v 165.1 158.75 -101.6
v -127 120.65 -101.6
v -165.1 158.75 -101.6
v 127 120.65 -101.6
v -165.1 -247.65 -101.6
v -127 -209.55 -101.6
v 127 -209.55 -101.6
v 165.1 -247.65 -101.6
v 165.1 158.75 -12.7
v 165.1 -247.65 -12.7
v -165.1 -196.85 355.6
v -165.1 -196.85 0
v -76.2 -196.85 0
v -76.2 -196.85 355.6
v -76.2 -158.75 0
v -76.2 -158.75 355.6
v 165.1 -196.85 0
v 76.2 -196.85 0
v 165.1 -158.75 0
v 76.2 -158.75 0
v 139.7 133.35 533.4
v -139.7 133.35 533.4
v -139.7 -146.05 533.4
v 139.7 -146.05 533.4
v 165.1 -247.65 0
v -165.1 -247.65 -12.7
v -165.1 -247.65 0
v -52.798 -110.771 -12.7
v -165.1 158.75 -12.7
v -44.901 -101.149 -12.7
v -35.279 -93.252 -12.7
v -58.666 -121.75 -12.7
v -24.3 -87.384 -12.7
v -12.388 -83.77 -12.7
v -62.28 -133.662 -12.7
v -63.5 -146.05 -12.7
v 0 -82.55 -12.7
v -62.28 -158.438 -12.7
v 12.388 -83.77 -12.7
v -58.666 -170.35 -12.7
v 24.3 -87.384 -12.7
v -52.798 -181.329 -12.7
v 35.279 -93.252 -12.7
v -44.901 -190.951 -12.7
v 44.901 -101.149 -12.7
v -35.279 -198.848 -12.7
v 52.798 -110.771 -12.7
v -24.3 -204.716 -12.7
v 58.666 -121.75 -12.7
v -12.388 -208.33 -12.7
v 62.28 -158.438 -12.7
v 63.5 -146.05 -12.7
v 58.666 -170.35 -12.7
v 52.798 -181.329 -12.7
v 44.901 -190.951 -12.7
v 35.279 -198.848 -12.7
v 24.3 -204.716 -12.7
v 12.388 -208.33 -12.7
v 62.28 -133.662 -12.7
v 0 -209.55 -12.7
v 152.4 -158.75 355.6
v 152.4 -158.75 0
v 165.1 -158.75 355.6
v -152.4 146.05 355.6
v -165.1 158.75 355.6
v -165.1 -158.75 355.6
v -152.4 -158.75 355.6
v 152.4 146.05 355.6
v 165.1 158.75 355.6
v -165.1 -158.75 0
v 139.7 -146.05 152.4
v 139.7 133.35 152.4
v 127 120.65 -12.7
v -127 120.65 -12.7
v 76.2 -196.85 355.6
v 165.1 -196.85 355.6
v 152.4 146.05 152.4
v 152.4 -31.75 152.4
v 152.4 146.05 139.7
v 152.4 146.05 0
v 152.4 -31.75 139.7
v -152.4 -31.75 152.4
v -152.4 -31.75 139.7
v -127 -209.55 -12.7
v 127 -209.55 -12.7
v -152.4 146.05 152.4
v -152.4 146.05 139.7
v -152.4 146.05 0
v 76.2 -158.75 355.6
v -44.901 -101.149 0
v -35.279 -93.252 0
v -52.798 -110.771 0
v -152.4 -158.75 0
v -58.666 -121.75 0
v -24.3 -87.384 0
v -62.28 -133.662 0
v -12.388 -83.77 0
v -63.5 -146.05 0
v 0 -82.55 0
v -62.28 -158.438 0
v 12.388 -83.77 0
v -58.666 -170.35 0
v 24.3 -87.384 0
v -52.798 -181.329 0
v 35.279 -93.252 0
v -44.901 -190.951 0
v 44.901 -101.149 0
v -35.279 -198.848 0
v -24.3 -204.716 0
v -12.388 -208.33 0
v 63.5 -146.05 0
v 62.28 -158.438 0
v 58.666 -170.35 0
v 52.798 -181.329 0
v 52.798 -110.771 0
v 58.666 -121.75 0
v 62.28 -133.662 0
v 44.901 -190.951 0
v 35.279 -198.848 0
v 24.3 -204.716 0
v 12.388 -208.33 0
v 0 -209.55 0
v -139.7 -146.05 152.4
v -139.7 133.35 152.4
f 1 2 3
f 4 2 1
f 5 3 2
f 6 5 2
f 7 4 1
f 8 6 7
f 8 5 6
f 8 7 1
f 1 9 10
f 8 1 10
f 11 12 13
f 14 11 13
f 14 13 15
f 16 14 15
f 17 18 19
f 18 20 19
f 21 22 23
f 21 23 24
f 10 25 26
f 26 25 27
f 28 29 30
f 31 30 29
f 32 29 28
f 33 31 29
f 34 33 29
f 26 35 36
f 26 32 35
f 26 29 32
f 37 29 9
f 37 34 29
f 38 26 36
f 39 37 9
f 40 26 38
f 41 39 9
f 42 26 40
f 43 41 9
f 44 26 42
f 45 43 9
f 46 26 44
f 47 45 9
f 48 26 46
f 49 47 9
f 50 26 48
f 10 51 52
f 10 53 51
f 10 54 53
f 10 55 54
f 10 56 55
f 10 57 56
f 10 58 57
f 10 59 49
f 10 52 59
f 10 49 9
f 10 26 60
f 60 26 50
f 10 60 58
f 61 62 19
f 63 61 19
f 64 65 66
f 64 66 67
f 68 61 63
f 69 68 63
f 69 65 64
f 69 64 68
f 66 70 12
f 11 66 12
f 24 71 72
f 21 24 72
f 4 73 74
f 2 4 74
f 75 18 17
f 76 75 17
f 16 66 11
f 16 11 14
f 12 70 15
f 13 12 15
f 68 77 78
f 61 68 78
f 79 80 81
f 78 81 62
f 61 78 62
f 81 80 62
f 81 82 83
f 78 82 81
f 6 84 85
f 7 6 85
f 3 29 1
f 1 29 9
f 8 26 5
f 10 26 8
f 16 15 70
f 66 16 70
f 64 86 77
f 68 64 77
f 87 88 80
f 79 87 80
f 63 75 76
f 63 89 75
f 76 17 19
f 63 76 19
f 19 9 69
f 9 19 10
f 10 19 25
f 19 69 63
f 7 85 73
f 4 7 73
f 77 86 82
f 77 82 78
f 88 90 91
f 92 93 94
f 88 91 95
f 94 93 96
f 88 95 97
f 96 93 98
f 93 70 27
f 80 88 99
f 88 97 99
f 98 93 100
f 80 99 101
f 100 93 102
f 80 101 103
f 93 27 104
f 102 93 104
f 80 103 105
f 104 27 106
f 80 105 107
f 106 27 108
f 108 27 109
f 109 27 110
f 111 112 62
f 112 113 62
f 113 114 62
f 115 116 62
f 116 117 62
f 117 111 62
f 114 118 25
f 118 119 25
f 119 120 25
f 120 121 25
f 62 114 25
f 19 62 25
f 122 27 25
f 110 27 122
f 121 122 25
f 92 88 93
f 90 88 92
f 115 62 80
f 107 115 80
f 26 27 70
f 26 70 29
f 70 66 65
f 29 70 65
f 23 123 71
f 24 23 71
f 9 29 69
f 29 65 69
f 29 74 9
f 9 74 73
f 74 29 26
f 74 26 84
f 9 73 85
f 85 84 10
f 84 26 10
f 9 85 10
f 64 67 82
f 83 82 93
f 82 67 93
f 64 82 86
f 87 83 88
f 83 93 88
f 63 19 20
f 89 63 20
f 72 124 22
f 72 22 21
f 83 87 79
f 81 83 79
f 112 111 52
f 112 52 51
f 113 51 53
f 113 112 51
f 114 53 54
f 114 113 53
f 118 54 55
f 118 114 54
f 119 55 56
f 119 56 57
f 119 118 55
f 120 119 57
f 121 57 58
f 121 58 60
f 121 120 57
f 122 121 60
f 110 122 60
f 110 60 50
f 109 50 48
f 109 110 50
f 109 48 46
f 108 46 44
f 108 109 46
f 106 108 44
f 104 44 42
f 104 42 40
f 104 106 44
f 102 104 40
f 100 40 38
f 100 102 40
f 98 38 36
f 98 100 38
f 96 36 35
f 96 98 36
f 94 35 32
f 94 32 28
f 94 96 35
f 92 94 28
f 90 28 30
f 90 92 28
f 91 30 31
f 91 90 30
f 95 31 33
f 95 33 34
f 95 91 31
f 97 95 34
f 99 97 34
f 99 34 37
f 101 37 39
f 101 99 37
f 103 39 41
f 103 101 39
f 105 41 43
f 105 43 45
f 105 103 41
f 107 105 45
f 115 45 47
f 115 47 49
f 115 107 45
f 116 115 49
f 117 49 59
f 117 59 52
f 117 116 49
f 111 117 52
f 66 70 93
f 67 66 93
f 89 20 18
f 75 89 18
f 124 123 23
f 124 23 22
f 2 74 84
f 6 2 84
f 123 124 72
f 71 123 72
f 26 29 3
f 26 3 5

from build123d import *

# Parameters (mm, degrees)
F1_DEPTH  = 355.6
F2_R      = 63.5
F3_DEPTH  = 12.7
F4_W      = 330.2
F4_H      = 406.4
F5_DEPTH  = 88.9
F7_W      = 279.4
F7_H      = 279.4
F8_DEPTH  = 381
F10_DEPTH = 355.6
F11_W     = 304.8
F11_H     = 177.8
F12_DEPTH = 12.7


with BuildPart() as f1:
    # F0 (on Top) → F1 (new body)
    with BuildSketch(Plane.XY):
        Polygon((165.1, 158.75), (-165.1, 158.75), (-165.1, -158.75), (-152.4, -158.75), (-152.4, 146.05), (152.4, 146.05), (152.4, -158.75), (165.1, -158.75), align=None)
    extrude(amount=F1_DEPTH)

    # F2 (on face) → F3 (join)
    with BuildSketch(Plane(origin=(0, 0, 0), x_dir=(1, 0, 0), z_dir=(0, 0, -1))):
        Polygon((152.4, 158.75), (165.1, 158.75), (165.1, 247.65), (-165.1, 247.65), (-165.1, 158.75), (-152.4, 158.75), (-152.4, -146.05), (152.4, -146.05), align=None)
        with Locations((0, 146.05)):
            Circle(F2_R, mode=Mode.SUBTRACT)
        Polygon((-165.1, -158.75), (165.1, -158.75), (165.1, 158.75), (152.4, 158.75), (152.4, -146.05), (-152.4, -146.05), (-152.4, 158.75), (-165.1, 158.75), align=None)
    extrude(amount=F3_DEPTH)

    # F11 (on offset) → F12 (join)
    with BuildSketch(Plane.XY.offset(152.4)):
        with Locations((0, 57.15)):
            Rectangle(F11_W, F11_H)
    extrude(amount=-F12_DEPTH)


with BuildPart() as f5:
    # F4 (on face) → F5 (new body)
    with BuildSketch(Plane(origin=(0, 0, -12.7), x_dir=(1, 0, 0), z_dir=(0, 0, -1))):
        with Locations((0, 44.45)):
            Rectangle(F4_W, F4_H)
        Polygon((127, -120.65), (-127, -120.65), (-127, 209.55), (0, 209.55), (127, 209.55), align=None, mode=Mode.SUBTRACT)
    extrude(amount=F5_DEPTH)


with BuildPart() as f8:
    # F7 (on offset) → F8 (new body)
    with BuildSketch(Plane.XY.offset(152.4)):
        with Locations((0, -6.35)):
            Rectangle(F7_W, F7_H)
    extrude(amount=F8_DEPTH)


with BuildPart() as f10:
    # F9 (on face) → F10 (new body, through all)
    with BuildSketch(Plane.XY):
        Polygon((-165.1, -158.75), (-165.1, -196.85), (-76.2, -196.85), (-76.2, -158.75), (-152.4, -158.75), align=None)
    extrude(amount=F10_DEPTH)


with BuildPart() as f10b:
    # F9 (on face) → F10, piece 2 (new body, through all)
    with BuildSketch(Plane.XY):
        Polygon((76.2, -196.85), (165.1, -196.85), (165.1, -158.75), (152.4, -158.75), (76.2, -158.75), align=None)
    extrude(amount=F10_DEPTH)


solid = Compound([f1.part, f5.part, f8.part, f10.part, f10b.part])
